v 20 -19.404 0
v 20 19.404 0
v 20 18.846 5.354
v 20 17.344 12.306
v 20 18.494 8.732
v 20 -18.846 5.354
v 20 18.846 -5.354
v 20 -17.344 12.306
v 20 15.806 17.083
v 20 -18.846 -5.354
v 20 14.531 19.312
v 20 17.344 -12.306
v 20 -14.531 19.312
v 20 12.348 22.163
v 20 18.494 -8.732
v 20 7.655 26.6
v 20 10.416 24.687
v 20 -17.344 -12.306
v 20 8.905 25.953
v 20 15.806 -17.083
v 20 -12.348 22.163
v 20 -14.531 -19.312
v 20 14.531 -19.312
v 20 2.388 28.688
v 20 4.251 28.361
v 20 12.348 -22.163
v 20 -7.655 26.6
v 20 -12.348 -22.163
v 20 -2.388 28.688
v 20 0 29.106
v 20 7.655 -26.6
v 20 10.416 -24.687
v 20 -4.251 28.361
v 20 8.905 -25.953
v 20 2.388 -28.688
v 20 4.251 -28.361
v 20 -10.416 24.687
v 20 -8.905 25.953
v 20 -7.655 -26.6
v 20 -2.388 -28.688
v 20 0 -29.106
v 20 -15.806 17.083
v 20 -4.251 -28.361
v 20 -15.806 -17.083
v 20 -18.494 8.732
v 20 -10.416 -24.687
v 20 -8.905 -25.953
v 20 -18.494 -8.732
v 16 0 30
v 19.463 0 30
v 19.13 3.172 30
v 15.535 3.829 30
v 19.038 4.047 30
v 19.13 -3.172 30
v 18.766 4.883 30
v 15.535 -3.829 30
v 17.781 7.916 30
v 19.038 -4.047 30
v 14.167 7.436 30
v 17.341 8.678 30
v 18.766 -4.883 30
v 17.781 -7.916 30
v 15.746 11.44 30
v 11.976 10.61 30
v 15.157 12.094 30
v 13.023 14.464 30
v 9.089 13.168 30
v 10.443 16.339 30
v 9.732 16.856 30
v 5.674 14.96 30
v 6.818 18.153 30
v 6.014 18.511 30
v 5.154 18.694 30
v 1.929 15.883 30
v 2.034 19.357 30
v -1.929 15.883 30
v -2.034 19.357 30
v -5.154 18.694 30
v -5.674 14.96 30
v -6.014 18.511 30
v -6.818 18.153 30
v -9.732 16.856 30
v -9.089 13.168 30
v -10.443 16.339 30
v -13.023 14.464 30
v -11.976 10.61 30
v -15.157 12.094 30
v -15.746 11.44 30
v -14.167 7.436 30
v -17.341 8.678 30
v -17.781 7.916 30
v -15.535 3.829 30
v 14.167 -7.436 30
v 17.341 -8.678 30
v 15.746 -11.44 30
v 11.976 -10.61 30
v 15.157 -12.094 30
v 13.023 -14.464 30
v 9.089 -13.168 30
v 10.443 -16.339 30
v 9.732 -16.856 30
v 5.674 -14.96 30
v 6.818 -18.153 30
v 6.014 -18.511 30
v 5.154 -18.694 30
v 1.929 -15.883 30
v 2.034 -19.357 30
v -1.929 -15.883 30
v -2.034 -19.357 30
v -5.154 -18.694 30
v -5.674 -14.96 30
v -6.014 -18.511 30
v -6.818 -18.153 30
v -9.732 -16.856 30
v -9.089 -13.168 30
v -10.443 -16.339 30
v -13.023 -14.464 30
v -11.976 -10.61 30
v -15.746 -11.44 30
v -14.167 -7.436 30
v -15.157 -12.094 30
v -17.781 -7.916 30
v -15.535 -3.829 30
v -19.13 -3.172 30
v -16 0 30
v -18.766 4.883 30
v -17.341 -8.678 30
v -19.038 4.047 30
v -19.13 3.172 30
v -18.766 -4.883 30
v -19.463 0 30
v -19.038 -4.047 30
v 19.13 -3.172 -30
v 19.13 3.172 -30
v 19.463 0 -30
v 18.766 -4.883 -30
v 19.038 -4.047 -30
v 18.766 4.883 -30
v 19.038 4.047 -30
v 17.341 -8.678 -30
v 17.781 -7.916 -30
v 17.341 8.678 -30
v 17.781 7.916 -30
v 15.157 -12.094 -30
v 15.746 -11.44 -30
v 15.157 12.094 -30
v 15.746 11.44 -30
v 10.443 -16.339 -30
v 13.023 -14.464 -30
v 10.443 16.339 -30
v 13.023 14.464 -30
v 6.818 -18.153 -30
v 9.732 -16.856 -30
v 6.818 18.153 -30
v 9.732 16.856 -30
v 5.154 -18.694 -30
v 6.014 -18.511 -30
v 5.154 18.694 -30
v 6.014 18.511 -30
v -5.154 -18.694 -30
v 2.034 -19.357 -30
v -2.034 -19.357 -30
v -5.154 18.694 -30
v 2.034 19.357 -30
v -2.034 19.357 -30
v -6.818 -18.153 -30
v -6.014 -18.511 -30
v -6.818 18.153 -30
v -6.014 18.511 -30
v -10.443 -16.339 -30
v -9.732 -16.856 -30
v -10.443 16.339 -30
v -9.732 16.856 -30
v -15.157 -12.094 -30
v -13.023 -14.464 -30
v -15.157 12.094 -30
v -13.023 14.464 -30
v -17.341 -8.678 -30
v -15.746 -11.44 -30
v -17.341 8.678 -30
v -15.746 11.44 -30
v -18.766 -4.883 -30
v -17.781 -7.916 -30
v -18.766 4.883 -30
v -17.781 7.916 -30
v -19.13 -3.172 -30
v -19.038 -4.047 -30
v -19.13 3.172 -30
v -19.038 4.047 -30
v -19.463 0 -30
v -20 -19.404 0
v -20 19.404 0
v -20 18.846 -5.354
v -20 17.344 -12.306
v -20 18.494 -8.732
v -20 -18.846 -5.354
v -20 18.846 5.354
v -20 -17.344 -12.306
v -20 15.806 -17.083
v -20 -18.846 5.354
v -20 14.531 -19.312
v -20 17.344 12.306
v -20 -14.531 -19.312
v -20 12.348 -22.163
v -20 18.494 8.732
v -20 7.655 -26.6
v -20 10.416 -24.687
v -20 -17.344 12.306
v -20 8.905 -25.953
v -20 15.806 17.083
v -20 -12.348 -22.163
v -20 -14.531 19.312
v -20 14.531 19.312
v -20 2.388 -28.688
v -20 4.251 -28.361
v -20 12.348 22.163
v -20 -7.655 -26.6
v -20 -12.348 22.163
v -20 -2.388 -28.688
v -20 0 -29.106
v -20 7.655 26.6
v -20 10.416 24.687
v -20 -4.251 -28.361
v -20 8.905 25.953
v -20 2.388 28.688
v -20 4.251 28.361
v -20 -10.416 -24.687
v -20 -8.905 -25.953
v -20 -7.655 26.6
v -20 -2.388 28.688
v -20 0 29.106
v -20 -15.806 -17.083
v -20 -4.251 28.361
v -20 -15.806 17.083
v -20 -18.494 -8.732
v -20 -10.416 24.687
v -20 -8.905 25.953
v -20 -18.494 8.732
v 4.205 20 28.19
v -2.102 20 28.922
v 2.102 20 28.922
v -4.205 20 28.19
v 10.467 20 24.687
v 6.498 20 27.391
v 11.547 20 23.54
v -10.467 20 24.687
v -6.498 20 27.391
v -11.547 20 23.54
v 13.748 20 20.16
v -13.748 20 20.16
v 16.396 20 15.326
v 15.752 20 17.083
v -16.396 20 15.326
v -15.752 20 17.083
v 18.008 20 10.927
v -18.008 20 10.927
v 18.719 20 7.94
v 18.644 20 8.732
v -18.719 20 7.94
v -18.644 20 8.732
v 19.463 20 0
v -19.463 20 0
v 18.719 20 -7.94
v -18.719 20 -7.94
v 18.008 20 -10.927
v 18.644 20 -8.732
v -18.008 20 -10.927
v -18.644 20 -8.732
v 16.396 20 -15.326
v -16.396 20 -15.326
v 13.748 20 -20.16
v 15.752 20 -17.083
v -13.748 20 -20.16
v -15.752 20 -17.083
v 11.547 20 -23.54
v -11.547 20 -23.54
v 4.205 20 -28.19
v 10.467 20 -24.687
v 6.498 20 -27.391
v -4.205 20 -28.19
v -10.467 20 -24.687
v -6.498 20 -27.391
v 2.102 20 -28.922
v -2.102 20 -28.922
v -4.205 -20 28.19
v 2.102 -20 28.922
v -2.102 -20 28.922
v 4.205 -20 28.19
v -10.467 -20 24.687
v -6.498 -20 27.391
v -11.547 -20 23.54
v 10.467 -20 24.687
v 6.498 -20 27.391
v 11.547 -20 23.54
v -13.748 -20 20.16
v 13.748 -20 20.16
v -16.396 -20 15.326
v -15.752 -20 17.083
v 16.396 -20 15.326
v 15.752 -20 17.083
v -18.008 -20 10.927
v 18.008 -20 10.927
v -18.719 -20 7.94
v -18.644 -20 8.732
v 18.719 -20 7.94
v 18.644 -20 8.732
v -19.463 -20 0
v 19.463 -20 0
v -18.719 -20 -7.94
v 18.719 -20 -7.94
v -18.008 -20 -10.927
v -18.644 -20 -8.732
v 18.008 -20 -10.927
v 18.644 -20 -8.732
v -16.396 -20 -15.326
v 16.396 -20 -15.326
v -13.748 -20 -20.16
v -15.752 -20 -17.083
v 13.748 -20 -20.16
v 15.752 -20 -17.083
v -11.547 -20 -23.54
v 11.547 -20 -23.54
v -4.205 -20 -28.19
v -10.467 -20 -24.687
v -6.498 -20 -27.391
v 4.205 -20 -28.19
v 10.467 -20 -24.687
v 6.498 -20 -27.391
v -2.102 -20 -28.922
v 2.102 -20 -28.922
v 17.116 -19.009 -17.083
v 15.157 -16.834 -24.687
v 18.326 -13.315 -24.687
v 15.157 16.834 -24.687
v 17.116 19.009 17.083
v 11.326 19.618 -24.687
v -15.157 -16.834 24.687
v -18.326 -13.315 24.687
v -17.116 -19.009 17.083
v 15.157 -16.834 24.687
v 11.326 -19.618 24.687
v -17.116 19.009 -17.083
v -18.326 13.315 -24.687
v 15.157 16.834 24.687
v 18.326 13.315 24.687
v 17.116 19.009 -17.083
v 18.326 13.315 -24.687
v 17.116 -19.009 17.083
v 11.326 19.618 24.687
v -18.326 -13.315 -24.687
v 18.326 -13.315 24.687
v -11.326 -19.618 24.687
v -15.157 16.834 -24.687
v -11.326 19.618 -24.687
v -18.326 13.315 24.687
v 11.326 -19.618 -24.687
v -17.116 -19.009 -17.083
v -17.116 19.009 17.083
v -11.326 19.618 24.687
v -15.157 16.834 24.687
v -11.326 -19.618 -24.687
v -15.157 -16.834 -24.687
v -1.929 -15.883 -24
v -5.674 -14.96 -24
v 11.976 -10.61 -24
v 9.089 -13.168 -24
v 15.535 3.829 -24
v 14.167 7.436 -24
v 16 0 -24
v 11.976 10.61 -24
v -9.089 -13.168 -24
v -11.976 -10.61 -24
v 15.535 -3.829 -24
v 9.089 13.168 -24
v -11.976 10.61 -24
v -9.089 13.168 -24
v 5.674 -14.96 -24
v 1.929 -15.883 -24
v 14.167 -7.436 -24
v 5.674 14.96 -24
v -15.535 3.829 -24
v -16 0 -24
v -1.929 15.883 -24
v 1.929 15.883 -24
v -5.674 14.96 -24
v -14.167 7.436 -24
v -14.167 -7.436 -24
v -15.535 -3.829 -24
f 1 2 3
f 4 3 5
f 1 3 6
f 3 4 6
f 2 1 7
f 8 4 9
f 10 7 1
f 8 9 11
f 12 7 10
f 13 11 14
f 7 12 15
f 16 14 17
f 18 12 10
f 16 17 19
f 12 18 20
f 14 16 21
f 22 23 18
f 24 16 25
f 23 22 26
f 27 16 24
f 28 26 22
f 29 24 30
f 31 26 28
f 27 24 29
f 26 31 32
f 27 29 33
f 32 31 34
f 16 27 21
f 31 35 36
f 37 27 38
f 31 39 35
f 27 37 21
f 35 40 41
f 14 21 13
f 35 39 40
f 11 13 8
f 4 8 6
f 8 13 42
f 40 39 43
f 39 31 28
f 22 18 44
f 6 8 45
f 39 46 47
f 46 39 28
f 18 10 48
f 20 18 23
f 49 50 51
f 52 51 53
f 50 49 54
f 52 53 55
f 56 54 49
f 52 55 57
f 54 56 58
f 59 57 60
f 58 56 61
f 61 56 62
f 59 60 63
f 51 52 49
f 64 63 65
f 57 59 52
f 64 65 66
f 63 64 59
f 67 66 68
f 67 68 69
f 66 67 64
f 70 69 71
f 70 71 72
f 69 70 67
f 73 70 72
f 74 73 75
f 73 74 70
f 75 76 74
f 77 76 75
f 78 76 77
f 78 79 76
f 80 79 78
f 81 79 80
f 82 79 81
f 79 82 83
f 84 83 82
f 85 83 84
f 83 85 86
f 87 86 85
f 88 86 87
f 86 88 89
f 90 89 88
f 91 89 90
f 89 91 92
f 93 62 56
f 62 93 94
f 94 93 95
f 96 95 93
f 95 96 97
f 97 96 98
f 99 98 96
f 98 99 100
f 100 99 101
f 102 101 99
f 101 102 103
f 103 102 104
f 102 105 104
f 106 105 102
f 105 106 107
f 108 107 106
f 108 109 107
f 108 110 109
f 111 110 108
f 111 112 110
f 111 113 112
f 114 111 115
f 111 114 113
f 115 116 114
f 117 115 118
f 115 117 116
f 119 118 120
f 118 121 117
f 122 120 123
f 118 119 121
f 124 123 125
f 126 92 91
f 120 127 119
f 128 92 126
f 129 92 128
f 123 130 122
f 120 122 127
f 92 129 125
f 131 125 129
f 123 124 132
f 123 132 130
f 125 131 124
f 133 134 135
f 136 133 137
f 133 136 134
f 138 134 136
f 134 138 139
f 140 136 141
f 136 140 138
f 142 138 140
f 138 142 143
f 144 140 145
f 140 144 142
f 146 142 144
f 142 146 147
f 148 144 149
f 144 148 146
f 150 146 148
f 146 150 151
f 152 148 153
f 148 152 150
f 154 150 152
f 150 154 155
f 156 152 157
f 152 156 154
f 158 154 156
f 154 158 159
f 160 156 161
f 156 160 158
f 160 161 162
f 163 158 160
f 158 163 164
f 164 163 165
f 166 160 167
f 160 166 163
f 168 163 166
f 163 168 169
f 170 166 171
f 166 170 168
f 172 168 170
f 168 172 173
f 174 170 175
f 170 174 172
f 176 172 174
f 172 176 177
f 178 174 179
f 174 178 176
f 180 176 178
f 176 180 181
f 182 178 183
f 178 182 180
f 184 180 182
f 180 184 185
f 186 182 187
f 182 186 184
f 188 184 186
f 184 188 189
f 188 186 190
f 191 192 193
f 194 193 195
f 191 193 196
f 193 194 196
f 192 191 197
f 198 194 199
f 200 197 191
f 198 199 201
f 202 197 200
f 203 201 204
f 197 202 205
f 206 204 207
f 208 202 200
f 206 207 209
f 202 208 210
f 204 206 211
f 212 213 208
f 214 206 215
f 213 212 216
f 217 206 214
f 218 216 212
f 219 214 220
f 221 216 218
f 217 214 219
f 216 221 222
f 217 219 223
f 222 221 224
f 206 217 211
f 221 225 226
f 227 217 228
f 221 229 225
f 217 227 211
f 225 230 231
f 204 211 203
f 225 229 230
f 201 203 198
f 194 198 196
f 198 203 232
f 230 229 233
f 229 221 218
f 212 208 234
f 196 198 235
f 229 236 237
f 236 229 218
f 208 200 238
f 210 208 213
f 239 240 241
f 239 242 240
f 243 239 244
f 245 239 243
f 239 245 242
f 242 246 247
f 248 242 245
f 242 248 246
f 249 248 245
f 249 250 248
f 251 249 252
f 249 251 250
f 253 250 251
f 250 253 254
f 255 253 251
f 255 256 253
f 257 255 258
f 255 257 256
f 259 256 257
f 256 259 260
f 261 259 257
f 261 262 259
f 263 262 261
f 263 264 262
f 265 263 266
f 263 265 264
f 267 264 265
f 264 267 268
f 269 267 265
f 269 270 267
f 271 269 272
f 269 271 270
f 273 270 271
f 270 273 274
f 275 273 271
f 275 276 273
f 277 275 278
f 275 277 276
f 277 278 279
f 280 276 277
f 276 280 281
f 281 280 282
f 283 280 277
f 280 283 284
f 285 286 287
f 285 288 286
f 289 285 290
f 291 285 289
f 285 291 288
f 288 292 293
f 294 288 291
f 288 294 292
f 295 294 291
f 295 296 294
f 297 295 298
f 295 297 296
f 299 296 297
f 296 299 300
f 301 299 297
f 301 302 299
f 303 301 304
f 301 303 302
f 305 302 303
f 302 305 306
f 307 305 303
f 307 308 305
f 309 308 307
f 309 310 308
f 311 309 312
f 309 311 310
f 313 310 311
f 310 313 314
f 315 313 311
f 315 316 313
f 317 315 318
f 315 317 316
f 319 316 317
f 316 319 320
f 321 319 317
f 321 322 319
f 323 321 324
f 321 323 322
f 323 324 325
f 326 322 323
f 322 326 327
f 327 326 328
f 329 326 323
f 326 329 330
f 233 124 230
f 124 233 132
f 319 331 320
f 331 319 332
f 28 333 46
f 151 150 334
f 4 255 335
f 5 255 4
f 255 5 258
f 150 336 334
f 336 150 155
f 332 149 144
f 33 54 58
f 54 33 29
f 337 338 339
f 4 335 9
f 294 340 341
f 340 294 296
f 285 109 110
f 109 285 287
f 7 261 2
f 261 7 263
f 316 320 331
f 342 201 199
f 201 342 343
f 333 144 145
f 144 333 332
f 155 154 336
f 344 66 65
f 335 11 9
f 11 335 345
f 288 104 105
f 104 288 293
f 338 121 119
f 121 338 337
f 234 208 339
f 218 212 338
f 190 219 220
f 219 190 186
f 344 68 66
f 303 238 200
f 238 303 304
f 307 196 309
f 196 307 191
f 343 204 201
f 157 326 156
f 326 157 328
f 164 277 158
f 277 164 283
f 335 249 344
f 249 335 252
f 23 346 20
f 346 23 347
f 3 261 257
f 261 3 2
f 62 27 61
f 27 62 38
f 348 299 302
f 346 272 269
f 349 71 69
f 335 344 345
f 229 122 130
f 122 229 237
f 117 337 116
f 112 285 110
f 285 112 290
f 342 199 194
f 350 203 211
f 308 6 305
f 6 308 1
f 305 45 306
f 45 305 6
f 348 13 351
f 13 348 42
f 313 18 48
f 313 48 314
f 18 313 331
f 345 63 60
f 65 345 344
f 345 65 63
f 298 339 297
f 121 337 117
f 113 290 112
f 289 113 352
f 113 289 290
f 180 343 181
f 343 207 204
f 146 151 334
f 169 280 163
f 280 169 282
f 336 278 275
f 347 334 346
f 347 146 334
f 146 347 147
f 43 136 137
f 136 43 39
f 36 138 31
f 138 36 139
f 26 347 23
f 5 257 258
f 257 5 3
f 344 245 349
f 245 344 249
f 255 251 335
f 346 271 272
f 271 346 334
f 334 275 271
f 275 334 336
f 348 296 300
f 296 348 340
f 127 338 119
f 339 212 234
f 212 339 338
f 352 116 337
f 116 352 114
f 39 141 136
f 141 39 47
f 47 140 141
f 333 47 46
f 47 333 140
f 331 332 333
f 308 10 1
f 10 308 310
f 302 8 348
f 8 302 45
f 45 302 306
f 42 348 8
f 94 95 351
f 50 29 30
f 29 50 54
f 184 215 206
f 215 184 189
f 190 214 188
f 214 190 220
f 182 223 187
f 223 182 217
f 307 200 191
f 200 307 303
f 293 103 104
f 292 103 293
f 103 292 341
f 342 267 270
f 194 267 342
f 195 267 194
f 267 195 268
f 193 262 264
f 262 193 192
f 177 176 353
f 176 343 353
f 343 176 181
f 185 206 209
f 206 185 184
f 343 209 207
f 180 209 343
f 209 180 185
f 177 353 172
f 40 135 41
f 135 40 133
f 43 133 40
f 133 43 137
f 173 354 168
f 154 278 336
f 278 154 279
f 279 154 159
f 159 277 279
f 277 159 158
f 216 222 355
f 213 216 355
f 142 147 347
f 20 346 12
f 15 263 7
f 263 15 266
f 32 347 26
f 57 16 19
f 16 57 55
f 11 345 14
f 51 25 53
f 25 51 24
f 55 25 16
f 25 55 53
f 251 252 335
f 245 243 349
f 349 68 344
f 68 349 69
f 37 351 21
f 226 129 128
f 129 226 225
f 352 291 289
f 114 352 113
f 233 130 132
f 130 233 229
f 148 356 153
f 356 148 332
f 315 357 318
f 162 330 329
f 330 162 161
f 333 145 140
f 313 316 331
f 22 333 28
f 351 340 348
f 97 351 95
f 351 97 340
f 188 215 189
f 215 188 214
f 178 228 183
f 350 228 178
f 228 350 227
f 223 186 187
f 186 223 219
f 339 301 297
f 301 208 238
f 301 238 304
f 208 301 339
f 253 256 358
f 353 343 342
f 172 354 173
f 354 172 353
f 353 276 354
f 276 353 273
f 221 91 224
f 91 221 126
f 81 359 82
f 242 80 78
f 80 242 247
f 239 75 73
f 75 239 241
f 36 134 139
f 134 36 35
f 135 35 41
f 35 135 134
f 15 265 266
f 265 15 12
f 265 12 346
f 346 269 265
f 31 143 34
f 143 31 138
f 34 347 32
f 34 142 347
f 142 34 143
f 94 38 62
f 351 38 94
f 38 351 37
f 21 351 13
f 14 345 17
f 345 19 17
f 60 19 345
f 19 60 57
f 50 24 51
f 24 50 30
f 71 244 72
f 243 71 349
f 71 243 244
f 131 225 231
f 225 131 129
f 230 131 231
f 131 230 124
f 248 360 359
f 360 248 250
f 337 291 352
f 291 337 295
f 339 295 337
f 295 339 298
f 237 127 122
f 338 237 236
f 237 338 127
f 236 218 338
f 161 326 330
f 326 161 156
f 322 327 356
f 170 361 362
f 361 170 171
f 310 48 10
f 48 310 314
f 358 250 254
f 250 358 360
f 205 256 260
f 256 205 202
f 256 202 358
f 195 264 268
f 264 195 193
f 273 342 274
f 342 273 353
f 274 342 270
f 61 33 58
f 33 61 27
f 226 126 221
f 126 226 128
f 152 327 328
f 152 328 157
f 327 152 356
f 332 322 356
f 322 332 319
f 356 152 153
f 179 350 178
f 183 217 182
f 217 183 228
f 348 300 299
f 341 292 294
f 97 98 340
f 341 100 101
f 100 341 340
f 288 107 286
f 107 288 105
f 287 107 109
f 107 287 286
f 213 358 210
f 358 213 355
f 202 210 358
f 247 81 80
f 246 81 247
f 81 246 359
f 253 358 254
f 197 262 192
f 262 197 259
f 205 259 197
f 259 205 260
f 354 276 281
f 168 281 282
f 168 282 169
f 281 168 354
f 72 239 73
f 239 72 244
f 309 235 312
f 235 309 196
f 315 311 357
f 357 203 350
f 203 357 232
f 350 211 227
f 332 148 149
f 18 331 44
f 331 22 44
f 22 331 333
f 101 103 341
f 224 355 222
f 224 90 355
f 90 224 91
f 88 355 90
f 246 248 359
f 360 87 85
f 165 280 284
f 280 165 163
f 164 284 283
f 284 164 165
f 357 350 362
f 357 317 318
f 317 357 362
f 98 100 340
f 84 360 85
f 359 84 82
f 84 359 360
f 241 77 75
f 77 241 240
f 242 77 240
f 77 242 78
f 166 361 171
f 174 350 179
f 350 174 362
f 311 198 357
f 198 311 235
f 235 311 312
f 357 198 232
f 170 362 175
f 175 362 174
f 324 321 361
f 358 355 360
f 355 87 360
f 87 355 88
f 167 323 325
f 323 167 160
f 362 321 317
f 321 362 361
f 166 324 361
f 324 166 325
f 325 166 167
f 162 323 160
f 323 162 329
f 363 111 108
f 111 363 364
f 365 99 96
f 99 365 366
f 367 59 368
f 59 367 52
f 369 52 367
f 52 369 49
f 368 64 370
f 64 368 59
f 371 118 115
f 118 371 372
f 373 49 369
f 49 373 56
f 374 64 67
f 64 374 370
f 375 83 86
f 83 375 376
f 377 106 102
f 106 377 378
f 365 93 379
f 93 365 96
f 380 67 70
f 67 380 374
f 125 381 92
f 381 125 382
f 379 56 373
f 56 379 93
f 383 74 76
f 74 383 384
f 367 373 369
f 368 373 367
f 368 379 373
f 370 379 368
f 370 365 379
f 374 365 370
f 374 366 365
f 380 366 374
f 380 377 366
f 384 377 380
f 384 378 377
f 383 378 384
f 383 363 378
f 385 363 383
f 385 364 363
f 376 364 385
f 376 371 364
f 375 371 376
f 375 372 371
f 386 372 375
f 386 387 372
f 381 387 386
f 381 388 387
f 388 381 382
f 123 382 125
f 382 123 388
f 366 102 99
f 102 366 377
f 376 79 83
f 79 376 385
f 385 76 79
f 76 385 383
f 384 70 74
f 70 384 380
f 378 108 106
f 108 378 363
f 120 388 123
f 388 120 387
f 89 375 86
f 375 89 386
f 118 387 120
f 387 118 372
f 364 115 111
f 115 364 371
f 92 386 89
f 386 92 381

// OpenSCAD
scale([2,2,3])
difference(){
    intersection(){
        cube([20,20,20], center=true);
        sphere(14);
    }
    translate([0,0,-8])
    cylinder(r=8,h=22);
}
       
